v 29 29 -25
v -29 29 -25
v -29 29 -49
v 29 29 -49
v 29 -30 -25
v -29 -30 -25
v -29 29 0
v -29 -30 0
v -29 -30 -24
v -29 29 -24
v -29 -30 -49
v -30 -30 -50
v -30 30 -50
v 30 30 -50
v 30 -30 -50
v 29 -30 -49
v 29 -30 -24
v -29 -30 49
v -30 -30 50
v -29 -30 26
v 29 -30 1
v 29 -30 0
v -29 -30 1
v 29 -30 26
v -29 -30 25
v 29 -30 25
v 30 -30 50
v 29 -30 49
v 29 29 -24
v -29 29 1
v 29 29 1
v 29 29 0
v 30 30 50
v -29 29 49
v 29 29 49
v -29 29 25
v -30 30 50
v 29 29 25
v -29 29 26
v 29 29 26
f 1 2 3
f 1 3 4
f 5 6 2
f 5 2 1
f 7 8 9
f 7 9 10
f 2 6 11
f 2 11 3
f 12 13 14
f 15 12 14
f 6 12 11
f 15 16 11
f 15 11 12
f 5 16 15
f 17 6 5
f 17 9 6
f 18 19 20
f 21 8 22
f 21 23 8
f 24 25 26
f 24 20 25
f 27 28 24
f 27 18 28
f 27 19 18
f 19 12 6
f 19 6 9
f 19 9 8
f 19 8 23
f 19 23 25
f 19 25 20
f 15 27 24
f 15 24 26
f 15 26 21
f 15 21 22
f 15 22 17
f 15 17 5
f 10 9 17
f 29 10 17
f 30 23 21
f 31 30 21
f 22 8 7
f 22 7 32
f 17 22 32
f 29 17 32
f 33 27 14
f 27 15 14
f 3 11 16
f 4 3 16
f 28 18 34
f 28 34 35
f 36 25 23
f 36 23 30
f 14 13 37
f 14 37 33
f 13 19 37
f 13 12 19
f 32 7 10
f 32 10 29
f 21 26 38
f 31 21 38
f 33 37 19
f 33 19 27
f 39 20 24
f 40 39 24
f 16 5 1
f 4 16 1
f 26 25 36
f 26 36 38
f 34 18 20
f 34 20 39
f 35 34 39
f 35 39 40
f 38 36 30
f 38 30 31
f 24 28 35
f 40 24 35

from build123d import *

# Parameters (mm, degrees)
F0_W      = 60
F0_H      = 60
F1_DEPTH  = 50
F2_T      = -1
F5_W      = 60
F5_H      = 60
F6_DEPTH  = 1
F7_W      = 60
F7_H      = 60
F8_DEPTH  = 1
F9_W      = 60
F9_H      = 60
F10_DEPTH = 1


with BuildPart() as f1:
    # F0 (on Top) → F1 (new body, symmetric)
    with BuildSketch(Plane.XY):
        Rectangle(F0_W, F0_H)
    extrude(amount=F1_DEPTH, both=True)

    # F2
    f2_openings = [f1.faces().sort_by_distance(p)[0] for p in [
        (0, -30, 0),
    ]]
    offset(amount=F2_T, openings=f2_openings)

    # F5 (on offset) → F6 (join)
    with BuildSketch(Plane.XY.offset(25)):
        Rectangle(F5_W, F5_H)
    extrude(amount=F6_DEPTH)

    # F7 (on Top) → F8 (join)
    with BuildSketch(Plane.XY):
        Rectangle(F7_W, F7_H)
    extrude(amount=F8_DEPTH)

    # F9 (on offset) → F10 (join)
    with BuildSketch(Plane.XY.offset(-25)):
        Rectangle(F9_W, F9_H)
    extrude(amount=F10_DEPTH)


solid = f1.part
